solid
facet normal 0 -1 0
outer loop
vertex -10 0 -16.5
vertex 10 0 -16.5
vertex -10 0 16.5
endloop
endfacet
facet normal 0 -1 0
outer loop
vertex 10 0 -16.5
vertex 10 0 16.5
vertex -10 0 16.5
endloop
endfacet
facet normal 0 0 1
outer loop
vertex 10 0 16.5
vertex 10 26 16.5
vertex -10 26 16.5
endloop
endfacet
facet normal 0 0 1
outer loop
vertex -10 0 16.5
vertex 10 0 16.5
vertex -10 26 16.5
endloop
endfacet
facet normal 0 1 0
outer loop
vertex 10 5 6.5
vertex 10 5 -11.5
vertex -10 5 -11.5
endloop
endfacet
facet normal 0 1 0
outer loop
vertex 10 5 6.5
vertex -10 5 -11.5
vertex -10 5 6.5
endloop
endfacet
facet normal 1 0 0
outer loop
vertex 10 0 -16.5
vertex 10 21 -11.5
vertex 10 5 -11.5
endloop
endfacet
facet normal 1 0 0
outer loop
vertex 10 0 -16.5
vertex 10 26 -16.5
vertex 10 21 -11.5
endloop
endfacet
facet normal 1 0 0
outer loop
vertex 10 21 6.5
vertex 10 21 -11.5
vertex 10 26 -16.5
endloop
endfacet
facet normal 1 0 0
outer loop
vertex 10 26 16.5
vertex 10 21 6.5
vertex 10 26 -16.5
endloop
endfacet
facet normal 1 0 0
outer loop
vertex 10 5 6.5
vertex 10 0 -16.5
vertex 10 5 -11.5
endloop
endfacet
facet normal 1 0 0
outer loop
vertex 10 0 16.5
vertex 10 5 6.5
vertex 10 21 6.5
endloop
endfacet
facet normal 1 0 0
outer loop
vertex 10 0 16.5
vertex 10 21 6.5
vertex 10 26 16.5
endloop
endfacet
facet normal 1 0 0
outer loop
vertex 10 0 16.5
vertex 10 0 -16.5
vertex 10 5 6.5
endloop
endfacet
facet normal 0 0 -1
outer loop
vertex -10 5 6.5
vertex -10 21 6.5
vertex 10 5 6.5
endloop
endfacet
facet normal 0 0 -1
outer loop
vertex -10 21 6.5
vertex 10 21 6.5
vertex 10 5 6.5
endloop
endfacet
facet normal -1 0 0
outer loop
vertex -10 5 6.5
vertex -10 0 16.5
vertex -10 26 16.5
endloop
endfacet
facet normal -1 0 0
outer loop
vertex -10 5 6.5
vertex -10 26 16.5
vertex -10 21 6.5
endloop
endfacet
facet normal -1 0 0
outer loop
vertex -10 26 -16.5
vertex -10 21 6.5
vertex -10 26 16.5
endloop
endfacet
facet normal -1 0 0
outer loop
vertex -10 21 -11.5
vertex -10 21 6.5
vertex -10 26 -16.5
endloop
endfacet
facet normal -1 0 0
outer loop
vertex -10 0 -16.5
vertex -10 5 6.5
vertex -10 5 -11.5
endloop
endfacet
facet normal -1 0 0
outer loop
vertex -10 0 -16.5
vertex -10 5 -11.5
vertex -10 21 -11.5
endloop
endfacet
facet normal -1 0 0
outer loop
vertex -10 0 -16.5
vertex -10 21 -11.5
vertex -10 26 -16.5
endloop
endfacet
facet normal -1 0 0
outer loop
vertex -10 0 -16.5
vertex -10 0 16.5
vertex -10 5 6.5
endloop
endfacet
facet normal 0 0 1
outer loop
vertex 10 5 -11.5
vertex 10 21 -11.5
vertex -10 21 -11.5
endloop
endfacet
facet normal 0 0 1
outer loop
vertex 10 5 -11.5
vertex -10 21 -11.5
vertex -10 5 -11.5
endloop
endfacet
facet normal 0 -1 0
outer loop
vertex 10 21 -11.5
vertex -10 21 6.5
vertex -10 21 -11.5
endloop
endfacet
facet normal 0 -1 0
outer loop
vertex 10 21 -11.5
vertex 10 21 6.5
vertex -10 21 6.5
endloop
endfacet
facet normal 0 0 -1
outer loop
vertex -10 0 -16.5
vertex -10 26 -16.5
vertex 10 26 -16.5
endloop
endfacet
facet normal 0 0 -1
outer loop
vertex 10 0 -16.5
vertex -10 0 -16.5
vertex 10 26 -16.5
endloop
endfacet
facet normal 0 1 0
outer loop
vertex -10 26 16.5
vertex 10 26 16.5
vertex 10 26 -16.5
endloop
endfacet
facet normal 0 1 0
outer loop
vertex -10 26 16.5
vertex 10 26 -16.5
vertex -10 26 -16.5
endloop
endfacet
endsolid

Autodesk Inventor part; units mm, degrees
ref_plane "YZ Plane" through (0, 0, 0) normal (1, 0, 0) x (0, 1, 0)
ref_plane "XZ Plane" through (0, 0, 0) normal (0, 1, 0) x (-1, 0, 0)
ref_plane "XY Plane" through (0, 0, 0) normal (0, 0, 1) x (1, 0, 0)
sketch "Sketch1" plane through (0, 0, 0) normal (0, 1, 0) x (-1, 0, 0)
  line L0 (-10, 16.5) -> (10, 16.5)
  line L1 (10, 16.5) -> (10, -16.5)
  line L2 (10, -16.5) -> (-10, -16.5)
  line L3 (-10, -16.5) -> (-10, 16.5)
  line L4 (-10, 16.5) -> (10, -16.5) construction
  line L5 (10, 16.5) -> (-10, -16.5) construction
  point P0 (0, 0)
  dimension "d0" = 20
  dimension "d1" = 33
extrude "Extrusion1" add sketch "Sketch1" along normal blind 26
sketch "Sketch2" plane through (10, 0, 16.5) normal (1, 0, 0) x (0, 0, -1)
  line L0 (0, 26) -> (33, 26) projected
  line L1 (0, 26) -> (0, 21)
  line L2 (0, 0) -> (0, 26) projected
  line L3 (10, 21) -> (28, 21)
  line L4 (33, 0) -> (33, 26) projected
  line L5 (33, 26) -> (28, 26)
  line L6 (28, 21) -> (28, 5)
  line L7 (33, 0) -> (0, 0) projected
  line L8 (33, 0) -> (33, 5)
  line L9 (28, 5) -> (10, 5)
  line L10 (0, 26) -> (10, 26)
  line L11 (10, 21) -> (10, 5)
  point P0 (16.5, 0)
  dimension "d4" = 5
  dimension "d5" = 5
  dimension "d6" = 5
  dimension "d7" = 10
extrude "Extrusion2" cut sketch "Sketch2" against normal blind 26 contours L3 L6 L9 L11
properties part number "Syring Mount"
